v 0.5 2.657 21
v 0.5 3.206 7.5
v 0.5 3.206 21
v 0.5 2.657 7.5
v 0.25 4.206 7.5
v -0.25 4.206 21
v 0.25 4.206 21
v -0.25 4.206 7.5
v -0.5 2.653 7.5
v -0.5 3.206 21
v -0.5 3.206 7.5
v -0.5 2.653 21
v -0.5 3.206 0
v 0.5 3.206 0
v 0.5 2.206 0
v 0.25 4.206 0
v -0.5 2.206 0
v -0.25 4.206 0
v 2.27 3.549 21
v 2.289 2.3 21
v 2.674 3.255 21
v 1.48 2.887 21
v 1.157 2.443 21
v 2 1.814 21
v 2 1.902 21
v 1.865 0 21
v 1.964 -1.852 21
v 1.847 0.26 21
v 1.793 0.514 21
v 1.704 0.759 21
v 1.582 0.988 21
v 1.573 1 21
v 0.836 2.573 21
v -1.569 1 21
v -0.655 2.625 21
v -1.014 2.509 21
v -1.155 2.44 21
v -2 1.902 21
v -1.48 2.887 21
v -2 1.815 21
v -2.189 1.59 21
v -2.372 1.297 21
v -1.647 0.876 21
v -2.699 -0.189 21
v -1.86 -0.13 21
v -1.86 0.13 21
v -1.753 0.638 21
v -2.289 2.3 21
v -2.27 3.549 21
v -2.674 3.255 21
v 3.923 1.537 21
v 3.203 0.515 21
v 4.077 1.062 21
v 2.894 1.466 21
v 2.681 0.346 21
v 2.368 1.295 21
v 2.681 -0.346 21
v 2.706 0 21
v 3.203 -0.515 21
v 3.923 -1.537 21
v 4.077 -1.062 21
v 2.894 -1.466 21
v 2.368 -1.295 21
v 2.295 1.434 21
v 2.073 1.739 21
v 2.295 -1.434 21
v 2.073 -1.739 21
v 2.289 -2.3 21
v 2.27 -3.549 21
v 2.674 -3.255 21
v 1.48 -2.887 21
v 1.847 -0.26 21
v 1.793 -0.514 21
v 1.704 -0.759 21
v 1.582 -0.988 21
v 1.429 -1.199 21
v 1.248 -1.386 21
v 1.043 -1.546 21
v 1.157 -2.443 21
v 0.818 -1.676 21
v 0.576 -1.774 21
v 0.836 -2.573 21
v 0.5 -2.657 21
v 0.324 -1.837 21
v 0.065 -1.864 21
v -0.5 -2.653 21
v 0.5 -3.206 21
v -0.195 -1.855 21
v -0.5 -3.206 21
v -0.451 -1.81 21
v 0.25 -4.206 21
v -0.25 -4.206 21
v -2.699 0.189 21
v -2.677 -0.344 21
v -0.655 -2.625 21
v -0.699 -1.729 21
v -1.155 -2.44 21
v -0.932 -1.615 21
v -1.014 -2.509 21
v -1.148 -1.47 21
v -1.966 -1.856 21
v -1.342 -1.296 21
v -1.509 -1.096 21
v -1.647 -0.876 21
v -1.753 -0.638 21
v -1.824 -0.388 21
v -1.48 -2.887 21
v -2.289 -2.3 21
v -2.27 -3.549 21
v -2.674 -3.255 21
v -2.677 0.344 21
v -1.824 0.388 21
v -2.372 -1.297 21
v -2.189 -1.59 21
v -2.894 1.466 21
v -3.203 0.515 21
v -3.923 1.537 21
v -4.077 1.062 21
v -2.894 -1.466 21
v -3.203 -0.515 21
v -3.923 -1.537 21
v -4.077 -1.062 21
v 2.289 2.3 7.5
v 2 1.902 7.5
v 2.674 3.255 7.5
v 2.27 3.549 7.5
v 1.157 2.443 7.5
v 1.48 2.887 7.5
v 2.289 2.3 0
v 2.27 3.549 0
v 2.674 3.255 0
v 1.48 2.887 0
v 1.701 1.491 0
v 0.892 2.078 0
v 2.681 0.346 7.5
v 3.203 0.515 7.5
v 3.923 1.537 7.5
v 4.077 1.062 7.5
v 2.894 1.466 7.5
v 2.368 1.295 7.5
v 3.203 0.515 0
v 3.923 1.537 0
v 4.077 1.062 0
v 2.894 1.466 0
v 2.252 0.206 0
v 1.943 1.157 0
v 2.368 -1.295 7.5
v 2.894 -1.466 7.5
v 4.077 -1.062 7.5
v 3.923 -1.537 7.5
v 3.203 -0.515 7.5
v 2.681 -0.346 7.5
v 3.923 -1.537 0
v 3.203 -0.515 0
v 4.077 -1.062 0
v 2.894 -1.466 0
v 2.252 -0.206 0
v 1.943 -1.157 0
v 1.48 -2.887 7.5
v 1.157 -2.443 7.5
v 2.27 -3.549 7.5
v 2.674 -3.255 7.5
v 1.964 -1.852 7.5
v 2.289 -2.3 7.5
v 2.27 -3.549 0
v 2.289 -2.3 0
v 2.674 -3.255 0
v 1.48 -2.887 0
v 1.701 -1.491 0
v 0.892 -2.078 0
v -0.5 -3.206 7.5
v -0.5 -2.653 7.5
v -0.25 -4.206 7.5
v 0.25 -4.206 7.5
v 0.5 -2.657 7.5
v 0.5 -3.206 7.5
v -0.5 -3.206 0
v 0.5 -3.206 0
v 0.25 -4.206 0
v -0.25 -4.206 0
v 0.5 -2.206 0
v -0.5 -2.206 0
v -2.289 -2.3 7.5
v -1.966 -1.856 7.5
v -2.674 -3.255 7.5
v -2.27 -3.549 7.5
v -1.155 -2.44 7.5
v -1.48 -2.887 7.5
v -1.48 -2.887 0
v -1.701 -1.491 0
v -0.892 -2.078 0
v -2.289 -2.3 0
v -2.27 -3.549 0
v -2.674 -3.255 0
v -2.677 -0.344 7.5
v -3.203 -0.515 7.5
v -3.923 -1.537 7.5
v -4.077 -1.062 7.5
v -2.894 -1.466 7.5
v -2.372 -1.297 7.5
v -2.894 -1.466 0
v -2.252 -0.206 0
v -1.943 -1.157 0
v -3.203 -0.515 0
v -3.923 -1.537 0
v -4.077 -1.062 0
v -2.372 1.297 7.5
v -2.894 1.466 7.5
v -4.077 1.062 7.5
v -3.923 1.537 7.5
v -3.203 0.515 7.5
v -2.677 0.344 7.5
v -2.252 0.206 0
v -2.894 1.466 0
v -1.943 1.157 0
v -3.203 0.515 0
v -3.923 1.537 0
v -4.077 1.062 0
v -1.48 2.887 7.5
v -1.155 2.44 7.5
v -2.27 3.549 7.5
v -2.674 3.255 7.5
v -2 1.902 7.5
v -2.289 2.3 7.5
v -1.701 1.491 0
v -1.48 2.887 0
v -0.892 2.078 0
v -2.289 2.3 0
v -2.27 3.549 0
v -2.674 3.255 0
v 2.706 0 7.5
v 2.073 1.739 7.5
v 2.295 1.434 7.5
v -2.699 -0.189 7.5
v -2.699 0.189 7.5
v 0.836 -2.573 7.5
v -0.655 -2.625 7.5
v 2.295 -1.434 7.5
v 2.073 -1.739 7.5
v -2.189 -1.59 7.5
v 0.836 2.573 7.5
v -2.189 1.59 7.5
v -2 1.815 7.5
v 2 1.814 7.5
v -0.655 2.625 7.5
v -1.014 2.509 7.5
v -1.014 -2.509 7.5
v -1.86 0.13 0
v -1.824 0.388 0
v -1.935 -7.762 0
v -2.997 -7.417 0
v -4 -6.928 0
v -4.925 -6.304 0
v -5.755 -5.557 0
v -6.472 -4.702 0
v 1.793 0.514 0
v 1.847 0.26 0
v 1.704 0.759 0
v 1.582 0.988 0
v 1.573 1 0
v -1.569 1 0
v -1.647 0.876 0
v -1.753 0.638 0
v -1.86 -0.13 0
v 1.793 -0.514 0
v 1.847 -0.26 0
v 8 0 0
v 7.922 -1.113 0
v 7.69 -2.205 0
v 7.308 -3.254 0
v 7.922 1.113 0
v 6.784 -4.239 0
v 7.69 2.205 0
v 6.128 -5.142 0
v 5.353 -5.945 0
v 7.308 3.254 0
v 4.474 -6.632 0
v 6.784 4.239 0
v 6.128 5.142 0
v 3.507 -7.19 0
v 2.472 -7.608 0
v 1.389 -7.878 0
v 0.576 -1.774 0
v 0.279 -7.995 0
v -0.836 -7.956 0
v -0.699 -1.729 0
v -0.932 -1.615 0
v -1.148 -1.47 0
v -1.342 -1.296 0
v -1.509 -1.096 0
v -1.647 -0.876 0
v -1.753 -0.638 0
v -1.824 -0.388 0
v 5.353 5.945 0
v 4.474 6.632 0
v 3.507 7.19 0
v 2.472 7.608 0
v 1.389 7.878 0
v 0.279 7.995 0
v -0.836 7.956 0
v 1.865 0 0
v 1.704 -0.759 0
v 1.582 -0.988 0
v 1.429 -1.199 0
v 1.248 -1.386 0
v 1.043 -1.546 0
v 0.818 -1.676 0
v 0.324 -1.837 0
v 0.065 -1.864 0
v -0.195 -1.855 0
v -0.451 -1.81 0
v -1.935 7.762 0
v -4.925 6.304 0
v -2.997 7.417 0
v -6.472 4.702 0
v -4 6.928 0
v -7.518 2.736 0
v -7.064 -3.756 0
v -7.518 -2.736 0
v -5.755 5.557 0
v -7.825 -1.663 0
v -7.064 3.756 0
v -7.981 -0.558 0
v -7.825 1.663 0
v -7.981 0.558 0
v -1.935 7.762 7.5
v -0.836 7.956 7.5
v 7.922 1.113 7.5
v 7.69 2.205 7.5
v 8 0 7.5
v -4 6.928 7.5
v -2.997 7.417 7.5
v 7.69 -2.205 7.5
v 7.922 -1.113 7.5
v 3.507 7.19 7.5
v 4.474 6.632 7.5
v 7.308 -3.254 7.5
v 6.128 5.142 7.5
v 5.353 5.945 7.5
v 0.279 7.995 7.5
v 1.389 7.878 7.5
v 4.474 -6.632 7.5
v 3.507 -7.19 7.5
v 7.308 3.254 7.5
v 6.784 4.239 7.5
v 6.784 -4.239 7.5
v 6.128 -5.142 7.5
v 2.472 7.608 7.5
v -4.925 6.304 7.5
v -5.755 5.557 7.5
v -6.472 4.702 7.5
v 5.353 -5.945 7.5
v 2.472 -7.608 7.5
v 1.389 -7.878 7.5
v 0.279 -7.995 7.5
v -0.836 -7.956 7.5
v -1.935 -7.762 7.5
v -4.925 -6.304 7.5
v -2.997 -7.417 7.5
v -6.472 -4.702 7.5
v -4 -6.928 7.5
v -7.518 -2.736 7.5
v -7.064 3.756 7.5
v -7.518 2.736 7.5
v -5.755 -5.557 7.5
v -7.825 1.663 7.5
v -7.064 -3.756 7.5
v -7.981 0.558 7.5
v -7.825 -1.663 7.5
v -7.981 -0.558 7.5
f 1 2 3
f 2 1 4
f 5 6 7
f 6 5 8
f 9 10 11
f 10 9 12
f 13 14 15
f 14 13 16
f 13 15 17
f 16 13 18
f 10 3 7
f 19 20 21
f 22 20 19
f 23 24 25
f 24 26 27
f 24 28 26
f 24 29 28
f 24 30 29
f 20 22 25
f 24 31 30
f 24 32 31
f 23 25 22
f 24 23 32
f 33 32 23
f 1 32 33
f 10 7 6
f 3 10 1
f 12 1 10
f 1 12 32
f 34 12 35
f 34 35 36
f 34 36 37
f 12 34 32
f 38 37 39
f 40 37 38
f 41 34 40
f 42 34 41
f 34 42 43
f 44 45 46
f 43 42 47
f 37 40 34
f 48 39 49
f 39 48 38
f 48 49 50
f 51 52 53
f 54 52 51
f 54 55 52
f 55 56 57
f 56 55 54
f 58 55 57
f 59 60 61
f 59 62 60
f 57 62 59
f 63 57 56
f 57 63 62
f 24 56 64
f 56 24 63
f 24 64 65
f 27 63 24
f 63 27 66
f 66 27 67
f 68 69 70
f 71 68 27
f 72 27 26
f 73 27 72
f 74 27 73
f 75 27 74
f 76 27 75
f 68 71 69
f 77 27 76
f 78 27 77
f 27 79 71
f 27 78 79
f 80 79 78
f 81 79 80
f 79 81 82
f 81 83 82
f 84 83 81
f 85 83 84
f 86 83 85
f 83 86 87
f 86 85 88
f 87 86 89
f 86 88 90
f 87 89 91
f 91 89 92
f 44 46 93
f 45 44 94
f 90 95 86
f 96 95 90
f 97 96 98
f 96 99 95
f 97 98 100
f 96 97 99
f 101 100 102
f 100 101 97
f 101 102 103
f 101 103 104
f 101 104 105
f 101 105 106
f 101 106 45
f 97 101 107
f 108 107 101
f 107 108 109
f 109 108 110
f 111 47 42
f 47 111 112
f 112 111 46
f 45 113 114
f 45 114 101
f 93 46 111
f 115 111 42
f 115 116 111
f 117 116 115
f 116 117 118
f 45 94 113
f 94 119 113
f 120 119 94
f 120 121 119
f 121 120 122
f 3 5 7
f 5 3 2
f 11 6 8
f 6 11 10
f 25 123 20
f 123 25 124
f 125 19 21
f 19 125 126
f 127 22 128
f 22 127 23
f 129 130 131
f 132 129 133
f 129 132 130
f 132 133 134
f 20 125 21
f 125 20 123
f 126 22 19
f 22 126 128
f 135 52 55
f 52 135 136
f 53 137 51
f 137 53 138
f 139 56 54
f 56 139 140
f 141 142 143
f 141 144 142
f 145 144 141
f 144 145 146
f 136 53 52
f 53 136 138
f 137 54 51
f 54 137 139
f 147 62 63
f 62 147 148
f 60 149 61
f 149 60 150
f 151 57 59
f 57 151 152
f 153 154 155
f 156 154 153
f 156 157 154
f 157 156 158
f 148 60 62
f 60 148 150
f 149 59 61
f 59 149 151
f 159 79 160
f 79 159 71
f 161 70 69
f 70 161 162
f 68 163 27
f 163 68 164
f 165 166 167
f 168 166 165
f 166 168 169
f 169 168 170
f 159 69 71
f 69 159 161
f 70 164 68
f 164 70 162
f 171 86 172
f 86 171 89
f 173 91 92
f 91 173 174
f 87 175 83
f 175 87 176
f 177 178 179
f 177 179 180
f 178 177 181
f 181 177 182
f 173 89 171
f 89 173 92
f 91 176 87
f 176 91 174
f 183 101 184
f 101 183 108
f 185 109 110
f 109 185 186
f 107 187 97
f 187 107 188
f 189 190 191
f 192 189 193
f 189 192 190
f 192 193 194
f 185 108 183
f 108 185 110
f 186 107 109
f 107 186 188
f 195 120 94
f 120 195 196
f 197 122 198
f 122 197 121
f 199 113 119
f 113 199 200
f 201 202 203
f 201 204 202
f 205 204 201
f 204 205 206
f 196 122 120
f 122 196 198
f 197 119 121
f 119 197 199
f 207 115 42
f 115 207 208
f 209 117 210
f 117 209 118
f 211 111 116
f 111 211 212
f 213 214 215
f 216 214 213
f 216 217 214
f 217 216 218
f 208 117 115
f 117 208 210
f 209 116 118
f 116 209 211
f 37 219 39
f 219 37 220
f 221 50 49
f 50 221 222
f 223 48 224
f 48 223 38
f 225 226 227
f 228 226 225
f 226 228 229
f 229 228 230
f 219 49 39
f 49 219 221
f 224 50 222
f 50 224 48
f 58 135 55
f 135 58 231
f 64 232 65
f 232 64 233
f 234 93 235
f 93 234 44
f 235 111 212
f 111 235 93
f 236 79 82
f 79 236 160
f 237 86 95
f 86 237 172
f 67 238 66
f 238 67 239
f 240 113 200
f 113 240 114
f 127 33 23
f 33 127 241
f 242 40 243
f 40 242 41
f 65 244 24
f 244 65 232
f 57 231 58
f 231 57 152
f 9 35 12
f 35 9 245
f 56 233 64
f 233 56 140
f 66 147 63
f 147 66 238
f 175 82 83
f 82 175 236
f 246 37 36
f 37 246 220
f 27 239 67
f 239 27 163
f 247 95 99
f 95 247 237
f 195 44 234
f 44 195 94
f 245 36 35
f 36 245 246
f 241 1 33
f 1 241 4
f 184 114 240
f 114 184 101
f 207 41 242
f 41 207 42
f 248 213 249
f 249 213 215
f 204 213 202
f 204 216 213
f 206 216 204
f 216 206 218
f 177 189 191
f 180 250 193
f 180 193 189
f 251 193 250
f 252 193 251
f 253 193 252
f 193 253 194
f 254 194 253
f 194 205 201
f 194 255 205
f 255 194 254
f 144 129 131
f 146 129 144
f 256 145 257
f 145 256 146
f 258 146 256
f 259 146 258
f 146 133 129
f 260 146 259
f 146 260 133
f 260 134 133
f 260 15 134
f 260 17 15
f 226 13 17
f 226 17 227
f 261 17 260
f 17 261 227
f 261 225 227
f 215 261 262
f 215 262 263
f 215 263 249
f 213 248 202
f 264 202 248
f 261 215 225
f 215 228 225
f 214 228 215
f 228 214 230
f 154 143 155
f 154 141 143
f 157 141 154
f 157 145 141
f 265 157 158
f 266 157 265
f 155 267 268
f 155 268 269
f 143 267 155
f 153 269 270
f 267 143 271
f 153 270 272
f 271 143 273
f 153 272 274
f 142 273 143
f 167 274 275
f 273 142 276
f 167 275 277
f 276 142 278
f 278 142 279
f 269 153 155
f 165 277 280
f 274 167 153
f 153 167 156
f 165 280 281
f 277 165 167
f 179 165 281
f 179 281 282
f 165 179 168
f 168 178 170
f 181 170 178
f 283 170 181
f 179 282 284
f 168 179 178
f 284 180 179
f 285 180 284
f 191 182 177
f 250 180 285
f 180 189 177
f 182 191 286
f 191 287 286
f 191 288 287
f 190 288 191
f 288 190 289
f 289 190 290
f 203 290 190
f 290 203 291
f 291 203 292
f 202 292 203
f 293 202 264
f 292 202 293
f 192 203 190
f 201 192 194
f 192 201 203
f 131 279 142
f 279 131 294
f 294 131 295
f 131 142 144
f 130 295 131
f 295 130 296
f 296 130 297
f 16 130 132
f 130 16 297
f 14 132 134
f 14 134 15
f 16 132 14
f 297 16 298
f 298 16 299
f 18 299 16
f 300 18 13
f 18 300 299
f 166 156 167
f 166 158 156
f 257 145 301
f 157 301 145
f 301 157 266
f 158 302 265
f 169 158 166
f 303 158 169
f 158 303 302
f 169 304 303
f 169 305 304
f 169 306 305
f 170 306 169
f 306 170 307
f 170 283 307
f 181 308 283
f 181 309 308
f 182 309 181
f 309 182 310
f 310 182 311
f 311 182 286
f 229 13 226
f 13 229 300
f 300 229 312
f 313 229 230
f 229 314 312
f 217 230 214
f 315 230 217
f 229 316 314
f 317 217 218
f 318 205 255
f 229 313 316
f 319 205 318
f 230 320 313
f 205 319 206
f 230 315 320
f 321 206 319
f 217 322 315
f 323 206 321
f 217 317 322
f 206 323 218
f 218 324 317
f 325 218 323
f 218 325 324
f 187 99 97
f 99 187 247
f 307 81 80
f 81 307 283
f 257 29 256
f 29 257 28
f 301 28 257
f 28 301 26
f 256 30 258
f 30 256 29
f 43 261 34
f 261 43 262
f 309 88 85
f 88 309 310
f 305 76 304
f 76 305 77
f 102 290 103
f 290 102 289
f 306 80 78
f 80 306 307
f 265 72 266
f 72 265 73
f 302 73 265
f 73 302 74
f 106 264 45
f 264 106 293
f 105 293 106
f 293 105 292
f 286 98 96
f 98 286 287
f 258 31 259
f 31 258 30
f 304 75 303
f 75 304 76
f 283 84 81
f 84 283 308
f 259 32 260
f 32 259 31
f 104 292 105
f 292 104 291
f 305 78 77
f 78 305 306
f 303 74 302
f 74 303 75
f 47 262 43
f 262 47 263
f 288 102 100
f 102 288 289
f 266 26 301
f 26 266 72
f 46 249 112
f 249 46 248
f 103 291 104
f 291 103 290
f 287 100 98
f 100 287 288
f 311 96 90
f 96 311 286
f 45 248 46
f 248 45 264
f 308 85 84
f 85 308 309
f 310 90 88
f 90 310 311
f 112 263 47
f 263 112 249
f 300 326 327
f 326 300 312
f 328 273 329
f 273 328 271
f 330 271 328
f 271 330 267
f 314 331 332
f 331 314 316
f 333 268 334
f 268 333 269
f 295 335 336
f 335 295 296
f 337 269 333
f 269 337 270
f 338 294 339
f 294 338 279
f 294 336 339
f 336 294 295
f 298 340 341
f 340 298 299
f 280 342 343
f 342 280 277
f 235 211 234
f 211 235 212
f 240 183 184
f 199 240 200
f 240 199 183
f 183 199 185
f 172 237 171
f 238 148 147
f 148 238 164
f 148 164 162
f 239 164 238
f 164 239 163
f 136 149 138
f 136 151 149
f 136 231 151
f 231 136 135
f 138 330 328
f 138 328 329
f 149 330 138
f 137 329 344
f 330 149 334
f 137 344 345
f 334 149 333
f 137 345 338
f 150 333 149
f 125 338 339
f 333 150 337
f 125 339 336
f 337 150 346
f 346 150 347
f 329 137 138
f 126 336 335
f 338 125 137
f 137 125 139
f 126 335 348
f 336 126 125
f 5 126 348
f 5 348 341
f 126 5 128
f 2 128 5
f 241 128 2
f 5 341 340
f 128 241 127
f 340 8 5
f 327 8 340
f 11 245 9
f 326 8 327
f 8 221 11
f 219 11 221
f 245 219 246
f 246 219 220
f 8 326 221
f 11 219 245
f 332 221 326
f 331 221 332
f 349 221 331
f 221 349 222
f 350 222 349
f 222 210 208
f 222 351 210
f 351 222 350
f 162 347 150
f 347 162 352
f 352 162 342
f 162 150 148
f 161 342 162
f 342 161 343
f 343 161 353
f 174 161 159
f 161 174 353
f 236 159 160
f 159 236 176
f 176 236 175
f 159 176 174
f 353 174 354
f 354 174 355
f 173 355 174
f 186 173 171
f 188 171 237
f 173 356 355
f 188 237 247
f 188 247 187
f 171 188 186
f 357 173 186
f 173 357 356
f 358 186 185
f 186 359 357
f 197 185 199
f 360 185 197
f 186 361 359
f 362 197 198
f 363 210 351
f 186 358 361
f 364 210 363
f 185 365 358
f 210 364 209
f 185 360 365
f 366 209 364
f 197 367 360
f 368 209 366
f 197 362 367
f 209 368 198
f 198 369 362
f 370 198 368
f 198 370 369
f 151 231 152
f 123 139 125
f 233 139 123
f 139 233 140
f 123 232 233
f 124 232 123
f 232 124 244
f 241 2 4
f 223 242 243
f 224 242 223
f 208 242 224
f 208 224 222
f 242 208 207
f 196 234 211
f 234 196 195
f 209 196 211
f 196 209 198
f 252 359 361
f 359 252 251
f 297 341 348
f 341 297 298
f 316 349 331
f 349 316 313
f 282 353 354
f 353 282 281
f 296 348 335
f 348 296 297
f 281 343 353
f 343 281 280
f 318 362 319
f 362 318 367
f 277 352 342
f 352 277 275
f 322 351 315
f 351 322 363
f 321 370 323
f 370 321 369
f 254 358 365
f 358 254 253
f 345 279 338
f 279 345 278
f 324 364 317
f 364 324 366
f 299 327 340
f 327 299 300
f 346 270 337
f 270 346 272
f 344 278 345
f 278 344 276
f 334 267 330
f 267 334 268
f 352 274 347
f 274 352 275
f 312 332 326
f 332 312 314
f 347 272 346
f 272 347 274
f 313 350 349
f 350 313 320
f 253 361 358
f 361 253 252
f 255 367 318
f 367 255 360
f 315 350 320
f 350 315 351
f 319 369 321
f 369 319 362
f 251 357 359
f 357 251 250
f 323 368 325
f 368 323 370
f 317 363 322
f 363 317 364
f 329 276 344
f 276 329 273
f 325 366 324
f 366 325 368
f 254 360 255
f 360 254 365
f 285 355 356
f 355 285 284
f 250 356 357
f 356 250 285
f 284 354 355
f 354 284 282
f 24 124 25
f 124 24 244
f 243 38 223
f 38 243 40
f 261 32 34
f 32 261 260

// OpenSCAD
$fn=45;
numberOfTeeth = 10;
widthOfTeeth = 1;
heightOfTeeth = 2;
thicknessOfGear = 21;
radiusOfHoleForShaft = 1.865;  //If shaft is square, find the square of one side,
sidesOfShaft = 45;                    //multiply by two and then square root that to get radius
//diameter = ((teethNo x 1.7 x teethWidth)/pi)+ 2teethHeight

module whole(){
module tooth(width, thickness, height){
    
  scale([width/5,thickness/5,height/10]){
    difference(){
      translate([-2.5,0,0])
      cube([5,5,10]);
      translate([5+1.25-2.5,0-1,0])
      rotate([0,-14.0362434,0])
        cube([5,5+2,12]);
      translate([0-1.25-2.5,0+5+1,0])
      rotate([0,-14.0362434,180])
        cube([5,5+2,12]);
    }
  }
}
module gear(toothNo, toothWidth, toothHeight, thickness,holeRadius,holeSides){
  radius = (toothWidth*1.7*toothNo)/3.141592653589793238/2;
  rotate([-90,0,0])
  difference(){
    union(){
      for(i=[0:toothNo]){
        rotate([0,(360/toothNo)*i,0])
        translate([0,0,radius-0.5])
          tooth(toothWidth,thickness,toothHeight);
      }
      translate([0,thickness,0])
      rotate([90,0,0])
        cylinder(r=radius, h=thickness);
    }
  translate([0,thickness+1,0])
  rotate([90,0,0])
    cylinder(r=holeRadius,h=thickness+2,$fn=holeSides);
  }
}

//cylinder(d=8.4, h=2);
translate([-2,1,0])
cube([4,1,21]);
translate([0,0,21])
gear(numberOfTeeth,widthOfTeeth,heightOfTeeth,thicknessOfGear,radiusOfHoleForShaft,sidesOfShaft);
difference(){
cylinder(d=16, h=7.5);
   translate([0,0,-0.1])
cylinder(d=4, h=7.7);
}
}

color("red")
whole();
